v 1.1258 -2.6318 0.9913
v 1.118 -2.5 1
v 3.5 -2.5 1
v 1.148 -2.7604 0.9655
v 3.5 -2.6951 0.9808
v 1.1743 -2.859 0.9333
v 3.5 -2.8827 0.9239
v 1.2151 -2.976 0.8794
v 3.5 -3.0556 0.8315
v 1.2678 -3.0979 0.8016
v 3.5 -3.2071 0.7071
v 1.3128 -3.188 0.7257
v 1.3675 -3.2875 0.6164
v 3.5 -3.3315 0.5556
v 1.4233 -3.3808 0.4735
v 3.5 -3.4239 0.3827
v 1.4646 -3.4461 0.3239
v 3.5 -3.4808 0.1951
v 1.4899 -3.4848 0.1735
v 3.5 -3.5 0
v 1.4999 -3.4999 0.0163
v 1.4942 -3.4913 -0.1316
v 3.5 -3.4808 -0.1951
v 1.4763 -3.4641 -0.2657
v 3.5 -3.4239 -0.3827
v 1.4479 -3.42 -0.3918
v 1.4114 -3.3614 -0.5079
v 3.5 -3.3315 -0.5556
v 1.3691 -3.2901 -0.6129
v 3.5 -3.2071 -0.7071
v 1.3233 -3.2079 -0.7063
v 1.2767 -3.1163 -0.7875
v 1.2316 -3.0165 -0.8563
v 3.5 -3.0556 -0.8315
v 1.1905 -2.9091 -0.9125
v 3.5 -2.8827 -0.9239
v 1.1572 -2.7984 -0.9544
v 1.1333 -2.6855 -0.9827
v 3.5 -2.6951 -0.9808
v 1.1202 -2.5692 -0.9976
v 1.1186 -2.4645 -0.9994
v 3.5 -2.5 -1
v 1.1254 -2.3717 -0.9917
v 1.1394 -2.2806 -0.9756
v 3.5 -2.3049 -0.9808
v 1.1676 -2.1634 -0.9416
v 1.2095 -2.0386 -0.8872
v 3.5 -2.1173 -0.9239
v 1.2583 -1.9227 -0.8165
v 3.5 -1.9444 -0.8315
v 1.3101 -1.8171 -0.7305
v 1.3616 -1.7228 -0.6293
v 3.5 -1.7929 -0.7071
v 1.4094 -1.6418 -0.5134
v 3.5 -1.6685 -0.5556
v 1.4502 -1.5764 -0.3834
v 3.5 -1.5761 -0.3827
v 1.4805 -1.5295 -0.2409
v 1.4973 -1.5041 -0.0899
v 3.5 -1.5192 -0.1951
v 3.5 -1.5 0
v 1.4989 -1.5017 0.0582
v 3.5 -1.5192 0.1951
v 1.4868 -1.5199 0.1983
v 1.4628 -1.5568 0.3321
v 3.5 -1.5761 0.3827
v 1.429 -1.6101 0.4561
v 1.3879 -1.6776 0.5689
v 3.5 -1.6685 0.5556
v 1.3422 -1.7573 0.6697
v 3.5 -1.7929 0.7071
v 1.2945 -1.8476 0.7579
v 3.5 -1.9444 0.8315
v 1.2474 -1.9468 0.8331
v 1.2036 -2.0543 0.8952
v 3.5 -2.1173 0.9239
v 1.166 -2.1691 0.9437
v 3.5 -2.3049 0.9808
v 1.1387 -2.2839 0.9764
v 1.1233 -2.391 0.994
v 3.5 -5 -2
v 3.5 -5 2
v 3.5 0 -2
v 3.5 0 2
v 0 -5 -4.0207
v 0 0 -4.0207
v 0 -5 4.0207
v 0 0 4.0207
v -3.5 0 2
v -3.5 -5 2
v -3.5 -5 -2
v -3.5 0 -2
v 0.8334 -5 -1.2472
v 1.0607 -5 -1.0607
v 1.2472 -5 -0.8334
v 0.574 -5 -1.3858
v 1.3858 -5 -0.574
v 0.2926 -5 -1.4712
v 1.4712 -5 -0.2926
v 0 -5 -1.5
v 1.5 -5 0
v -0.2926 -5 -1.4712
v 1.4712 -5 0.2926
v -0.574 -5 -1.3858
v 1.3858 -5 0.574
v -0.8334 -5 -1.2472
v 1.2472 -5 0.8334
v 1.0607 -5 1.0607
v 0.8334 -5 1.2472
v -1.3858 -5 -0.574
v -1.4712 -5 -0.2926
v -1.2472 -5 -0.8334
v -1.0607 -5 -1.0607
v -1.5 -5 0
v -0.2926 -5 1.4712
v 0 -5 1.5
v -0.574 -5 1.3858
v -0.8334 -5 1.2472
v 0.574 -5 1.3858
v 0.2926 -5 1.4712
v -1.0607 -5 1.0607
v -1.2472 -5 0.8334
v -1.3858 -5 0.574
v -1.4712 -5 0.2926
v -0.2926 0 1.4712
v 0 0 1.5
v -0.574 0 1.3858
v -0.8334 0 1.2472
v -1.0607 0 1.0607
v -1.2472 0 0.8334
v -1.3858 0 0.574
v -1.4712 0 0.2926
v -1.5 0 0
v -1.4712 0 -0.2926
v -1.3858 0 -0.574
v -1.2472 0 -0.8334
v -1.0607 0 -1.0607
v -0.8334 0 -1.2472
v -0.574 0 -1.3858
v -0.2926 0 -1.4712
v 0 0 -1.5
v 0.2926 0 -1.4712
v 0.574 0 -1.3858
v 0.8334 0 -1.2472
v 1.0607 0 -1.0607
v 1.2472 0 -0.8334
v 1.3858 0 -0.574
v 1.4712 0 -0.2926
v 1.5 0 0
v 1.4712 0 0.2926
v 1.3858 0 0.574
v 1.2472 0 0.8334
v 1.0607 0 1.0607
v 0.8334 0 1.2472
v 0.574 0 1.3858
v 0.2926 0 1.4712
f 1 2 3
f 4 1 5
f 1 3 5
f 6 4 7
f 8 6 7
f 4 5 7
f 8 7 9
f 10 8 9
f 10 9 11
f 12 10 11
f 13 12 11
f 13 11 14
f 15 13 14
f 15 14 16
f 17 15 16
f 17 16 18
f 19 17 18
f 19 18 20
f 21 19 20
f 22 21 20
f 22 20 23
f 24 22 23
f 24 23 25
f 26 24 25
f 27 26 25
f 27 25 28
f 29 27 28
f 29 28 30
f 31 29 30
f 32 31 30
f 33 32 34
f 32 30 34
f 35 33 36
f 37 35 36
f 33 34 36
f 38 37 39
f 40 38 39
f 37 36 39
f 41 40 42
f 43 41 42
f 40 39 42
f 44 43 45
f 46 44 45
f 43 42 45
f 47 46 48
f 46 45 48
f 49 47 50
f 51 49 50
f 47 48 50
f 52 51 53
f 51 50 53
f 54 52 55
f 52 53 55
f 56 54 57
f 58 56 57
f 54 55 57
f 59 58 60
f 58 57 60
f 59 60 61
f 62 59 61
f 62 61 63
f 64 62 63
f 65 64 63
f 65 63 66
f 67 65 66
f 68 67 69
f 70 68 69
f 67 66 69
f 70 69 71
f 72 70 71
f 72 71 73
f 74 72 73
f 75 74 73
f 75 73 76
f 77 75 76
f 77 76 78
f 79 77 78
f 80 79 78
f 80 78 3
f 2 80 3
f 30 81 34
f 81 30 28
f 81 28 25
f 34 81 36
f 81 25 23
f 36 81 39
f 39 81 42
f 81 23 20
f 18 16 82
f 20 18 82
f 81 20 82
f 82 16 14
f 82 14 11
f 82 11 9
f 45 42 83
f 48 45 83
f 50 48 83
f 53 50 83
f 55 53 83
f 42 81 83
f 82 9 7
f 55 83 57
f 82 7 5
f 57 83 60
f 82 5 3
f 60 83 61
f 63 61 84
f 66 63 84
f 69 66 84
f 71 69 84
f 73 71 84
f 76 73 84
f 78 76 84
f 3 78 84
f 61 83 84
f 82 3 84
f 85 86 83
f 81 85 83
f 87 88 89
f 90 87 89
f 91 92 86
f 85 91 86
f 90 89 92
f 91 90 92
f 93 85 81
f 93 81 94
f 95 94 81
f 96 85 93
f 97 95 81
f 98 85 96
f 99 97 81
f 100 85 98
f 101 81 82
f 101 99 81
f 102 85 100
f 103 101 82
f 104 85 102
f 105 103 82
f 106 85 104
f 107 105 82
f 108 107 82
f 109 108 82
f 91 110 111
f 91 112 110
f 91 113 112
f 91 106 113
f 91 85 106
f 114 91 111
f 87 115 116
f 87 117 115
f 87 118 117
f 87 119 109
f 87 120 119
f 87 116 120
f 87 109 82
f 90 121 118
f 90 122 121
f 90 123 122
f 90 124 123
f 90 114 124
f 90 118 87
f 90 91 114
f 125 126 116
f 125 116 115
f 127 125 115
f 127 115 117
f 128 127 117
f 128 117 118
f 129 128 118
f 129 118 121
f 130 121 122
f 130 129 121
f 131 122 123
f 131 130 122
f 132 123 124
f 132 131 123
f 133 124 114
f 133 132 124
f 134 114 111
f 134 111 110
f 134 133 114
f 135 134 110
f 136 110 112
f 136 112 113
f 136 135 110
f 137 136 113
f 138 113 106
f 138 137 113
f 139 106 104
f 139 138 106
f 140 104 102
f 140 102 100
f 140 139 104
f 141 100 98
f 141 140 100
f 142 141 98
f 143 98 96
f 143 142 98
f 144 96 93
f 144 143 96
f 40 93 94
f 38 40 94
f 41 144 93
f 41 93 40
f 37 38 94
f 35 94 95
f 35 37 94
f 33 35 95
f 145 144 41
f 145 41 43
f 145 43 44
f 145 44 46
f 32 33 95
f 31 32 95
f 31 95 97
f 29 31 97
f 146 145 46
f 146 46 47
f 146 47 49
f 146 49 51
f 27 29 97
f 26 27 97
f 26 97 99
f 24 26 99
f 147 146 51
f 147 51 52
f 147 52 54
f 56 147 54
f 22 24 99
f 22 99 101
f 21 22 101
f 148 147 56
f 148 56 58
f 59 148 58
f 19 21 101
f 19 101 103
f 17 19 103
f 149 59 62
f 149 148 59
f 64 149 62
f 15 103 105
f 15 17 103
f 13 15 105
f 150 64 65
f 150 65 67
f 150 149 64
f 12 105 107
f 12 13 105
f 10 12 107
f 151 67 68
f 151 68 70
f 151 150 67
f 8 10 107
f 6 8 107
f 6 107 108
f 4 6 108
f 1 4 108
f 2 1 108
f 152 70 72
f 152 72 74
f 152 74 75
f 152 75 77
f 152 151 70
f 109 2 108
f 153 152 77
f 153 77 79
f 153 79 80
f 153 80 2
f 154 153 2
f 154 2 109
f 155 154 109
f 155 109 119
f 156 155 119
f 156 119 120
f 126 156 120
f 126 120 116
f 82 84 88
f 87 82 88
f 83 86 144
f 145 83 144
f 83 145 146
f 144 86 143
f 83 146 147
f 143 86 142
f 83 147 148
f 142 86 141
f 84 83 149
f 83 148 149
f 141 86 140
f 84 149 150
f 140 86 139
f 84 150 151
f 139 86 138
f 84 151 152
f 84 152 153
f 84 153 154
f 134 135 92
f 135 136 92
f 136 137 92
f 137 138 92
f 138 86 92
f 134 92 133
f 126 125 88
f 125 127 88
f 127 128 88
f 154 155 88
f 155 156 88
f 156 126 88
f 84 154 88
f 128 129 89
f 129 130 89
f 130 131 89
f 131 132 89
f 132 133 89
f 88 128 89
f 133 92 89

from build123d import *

# Parameters (mm, degrees)
F0_R     = 1.5
F1_DEPTH = 5
F2_R     = 1
F3_DEPTH = 3
F5_ANGLE = 90
F7_ANGLE = 90


with BuildPart() as f1:
    # F0 (on Top) → F1 (new body)
    with BuildSketch(Plane.XY):
        Polygon((2, 3.5), (-2, 3.5), (-4.020726, 0), (-2, -3.5), (2, -3.5), (4.020726, 0), align=None)
        Circle(F0_R, mode=Mode.SUBTRACT)
    extrude(amount=F1_DEPTH)

    # F2 (on face) → F3 (cut)
    with BuildSketch(Plane.XZ.offset(3.5)):
        with Locations((0, 2.5)):
            Circle(F2_R)
    extrude(amount=-F3_DEPTH, mode=Mode.SUBTRACT)


with BuildPart() as f1_1:
    # F5: moved
    add(f1.part.rotate(Axis((2.035894, 0, 0), (1, 0, 0)), F5_ANGLE))


with BuildPart() as f1_2:
    # F7: moved
    add(f1_1.part.rotate(Axis((0, 0.571142, 0), (0, -1, 0)), F7_ANGLE))


solid = f1_2.part
